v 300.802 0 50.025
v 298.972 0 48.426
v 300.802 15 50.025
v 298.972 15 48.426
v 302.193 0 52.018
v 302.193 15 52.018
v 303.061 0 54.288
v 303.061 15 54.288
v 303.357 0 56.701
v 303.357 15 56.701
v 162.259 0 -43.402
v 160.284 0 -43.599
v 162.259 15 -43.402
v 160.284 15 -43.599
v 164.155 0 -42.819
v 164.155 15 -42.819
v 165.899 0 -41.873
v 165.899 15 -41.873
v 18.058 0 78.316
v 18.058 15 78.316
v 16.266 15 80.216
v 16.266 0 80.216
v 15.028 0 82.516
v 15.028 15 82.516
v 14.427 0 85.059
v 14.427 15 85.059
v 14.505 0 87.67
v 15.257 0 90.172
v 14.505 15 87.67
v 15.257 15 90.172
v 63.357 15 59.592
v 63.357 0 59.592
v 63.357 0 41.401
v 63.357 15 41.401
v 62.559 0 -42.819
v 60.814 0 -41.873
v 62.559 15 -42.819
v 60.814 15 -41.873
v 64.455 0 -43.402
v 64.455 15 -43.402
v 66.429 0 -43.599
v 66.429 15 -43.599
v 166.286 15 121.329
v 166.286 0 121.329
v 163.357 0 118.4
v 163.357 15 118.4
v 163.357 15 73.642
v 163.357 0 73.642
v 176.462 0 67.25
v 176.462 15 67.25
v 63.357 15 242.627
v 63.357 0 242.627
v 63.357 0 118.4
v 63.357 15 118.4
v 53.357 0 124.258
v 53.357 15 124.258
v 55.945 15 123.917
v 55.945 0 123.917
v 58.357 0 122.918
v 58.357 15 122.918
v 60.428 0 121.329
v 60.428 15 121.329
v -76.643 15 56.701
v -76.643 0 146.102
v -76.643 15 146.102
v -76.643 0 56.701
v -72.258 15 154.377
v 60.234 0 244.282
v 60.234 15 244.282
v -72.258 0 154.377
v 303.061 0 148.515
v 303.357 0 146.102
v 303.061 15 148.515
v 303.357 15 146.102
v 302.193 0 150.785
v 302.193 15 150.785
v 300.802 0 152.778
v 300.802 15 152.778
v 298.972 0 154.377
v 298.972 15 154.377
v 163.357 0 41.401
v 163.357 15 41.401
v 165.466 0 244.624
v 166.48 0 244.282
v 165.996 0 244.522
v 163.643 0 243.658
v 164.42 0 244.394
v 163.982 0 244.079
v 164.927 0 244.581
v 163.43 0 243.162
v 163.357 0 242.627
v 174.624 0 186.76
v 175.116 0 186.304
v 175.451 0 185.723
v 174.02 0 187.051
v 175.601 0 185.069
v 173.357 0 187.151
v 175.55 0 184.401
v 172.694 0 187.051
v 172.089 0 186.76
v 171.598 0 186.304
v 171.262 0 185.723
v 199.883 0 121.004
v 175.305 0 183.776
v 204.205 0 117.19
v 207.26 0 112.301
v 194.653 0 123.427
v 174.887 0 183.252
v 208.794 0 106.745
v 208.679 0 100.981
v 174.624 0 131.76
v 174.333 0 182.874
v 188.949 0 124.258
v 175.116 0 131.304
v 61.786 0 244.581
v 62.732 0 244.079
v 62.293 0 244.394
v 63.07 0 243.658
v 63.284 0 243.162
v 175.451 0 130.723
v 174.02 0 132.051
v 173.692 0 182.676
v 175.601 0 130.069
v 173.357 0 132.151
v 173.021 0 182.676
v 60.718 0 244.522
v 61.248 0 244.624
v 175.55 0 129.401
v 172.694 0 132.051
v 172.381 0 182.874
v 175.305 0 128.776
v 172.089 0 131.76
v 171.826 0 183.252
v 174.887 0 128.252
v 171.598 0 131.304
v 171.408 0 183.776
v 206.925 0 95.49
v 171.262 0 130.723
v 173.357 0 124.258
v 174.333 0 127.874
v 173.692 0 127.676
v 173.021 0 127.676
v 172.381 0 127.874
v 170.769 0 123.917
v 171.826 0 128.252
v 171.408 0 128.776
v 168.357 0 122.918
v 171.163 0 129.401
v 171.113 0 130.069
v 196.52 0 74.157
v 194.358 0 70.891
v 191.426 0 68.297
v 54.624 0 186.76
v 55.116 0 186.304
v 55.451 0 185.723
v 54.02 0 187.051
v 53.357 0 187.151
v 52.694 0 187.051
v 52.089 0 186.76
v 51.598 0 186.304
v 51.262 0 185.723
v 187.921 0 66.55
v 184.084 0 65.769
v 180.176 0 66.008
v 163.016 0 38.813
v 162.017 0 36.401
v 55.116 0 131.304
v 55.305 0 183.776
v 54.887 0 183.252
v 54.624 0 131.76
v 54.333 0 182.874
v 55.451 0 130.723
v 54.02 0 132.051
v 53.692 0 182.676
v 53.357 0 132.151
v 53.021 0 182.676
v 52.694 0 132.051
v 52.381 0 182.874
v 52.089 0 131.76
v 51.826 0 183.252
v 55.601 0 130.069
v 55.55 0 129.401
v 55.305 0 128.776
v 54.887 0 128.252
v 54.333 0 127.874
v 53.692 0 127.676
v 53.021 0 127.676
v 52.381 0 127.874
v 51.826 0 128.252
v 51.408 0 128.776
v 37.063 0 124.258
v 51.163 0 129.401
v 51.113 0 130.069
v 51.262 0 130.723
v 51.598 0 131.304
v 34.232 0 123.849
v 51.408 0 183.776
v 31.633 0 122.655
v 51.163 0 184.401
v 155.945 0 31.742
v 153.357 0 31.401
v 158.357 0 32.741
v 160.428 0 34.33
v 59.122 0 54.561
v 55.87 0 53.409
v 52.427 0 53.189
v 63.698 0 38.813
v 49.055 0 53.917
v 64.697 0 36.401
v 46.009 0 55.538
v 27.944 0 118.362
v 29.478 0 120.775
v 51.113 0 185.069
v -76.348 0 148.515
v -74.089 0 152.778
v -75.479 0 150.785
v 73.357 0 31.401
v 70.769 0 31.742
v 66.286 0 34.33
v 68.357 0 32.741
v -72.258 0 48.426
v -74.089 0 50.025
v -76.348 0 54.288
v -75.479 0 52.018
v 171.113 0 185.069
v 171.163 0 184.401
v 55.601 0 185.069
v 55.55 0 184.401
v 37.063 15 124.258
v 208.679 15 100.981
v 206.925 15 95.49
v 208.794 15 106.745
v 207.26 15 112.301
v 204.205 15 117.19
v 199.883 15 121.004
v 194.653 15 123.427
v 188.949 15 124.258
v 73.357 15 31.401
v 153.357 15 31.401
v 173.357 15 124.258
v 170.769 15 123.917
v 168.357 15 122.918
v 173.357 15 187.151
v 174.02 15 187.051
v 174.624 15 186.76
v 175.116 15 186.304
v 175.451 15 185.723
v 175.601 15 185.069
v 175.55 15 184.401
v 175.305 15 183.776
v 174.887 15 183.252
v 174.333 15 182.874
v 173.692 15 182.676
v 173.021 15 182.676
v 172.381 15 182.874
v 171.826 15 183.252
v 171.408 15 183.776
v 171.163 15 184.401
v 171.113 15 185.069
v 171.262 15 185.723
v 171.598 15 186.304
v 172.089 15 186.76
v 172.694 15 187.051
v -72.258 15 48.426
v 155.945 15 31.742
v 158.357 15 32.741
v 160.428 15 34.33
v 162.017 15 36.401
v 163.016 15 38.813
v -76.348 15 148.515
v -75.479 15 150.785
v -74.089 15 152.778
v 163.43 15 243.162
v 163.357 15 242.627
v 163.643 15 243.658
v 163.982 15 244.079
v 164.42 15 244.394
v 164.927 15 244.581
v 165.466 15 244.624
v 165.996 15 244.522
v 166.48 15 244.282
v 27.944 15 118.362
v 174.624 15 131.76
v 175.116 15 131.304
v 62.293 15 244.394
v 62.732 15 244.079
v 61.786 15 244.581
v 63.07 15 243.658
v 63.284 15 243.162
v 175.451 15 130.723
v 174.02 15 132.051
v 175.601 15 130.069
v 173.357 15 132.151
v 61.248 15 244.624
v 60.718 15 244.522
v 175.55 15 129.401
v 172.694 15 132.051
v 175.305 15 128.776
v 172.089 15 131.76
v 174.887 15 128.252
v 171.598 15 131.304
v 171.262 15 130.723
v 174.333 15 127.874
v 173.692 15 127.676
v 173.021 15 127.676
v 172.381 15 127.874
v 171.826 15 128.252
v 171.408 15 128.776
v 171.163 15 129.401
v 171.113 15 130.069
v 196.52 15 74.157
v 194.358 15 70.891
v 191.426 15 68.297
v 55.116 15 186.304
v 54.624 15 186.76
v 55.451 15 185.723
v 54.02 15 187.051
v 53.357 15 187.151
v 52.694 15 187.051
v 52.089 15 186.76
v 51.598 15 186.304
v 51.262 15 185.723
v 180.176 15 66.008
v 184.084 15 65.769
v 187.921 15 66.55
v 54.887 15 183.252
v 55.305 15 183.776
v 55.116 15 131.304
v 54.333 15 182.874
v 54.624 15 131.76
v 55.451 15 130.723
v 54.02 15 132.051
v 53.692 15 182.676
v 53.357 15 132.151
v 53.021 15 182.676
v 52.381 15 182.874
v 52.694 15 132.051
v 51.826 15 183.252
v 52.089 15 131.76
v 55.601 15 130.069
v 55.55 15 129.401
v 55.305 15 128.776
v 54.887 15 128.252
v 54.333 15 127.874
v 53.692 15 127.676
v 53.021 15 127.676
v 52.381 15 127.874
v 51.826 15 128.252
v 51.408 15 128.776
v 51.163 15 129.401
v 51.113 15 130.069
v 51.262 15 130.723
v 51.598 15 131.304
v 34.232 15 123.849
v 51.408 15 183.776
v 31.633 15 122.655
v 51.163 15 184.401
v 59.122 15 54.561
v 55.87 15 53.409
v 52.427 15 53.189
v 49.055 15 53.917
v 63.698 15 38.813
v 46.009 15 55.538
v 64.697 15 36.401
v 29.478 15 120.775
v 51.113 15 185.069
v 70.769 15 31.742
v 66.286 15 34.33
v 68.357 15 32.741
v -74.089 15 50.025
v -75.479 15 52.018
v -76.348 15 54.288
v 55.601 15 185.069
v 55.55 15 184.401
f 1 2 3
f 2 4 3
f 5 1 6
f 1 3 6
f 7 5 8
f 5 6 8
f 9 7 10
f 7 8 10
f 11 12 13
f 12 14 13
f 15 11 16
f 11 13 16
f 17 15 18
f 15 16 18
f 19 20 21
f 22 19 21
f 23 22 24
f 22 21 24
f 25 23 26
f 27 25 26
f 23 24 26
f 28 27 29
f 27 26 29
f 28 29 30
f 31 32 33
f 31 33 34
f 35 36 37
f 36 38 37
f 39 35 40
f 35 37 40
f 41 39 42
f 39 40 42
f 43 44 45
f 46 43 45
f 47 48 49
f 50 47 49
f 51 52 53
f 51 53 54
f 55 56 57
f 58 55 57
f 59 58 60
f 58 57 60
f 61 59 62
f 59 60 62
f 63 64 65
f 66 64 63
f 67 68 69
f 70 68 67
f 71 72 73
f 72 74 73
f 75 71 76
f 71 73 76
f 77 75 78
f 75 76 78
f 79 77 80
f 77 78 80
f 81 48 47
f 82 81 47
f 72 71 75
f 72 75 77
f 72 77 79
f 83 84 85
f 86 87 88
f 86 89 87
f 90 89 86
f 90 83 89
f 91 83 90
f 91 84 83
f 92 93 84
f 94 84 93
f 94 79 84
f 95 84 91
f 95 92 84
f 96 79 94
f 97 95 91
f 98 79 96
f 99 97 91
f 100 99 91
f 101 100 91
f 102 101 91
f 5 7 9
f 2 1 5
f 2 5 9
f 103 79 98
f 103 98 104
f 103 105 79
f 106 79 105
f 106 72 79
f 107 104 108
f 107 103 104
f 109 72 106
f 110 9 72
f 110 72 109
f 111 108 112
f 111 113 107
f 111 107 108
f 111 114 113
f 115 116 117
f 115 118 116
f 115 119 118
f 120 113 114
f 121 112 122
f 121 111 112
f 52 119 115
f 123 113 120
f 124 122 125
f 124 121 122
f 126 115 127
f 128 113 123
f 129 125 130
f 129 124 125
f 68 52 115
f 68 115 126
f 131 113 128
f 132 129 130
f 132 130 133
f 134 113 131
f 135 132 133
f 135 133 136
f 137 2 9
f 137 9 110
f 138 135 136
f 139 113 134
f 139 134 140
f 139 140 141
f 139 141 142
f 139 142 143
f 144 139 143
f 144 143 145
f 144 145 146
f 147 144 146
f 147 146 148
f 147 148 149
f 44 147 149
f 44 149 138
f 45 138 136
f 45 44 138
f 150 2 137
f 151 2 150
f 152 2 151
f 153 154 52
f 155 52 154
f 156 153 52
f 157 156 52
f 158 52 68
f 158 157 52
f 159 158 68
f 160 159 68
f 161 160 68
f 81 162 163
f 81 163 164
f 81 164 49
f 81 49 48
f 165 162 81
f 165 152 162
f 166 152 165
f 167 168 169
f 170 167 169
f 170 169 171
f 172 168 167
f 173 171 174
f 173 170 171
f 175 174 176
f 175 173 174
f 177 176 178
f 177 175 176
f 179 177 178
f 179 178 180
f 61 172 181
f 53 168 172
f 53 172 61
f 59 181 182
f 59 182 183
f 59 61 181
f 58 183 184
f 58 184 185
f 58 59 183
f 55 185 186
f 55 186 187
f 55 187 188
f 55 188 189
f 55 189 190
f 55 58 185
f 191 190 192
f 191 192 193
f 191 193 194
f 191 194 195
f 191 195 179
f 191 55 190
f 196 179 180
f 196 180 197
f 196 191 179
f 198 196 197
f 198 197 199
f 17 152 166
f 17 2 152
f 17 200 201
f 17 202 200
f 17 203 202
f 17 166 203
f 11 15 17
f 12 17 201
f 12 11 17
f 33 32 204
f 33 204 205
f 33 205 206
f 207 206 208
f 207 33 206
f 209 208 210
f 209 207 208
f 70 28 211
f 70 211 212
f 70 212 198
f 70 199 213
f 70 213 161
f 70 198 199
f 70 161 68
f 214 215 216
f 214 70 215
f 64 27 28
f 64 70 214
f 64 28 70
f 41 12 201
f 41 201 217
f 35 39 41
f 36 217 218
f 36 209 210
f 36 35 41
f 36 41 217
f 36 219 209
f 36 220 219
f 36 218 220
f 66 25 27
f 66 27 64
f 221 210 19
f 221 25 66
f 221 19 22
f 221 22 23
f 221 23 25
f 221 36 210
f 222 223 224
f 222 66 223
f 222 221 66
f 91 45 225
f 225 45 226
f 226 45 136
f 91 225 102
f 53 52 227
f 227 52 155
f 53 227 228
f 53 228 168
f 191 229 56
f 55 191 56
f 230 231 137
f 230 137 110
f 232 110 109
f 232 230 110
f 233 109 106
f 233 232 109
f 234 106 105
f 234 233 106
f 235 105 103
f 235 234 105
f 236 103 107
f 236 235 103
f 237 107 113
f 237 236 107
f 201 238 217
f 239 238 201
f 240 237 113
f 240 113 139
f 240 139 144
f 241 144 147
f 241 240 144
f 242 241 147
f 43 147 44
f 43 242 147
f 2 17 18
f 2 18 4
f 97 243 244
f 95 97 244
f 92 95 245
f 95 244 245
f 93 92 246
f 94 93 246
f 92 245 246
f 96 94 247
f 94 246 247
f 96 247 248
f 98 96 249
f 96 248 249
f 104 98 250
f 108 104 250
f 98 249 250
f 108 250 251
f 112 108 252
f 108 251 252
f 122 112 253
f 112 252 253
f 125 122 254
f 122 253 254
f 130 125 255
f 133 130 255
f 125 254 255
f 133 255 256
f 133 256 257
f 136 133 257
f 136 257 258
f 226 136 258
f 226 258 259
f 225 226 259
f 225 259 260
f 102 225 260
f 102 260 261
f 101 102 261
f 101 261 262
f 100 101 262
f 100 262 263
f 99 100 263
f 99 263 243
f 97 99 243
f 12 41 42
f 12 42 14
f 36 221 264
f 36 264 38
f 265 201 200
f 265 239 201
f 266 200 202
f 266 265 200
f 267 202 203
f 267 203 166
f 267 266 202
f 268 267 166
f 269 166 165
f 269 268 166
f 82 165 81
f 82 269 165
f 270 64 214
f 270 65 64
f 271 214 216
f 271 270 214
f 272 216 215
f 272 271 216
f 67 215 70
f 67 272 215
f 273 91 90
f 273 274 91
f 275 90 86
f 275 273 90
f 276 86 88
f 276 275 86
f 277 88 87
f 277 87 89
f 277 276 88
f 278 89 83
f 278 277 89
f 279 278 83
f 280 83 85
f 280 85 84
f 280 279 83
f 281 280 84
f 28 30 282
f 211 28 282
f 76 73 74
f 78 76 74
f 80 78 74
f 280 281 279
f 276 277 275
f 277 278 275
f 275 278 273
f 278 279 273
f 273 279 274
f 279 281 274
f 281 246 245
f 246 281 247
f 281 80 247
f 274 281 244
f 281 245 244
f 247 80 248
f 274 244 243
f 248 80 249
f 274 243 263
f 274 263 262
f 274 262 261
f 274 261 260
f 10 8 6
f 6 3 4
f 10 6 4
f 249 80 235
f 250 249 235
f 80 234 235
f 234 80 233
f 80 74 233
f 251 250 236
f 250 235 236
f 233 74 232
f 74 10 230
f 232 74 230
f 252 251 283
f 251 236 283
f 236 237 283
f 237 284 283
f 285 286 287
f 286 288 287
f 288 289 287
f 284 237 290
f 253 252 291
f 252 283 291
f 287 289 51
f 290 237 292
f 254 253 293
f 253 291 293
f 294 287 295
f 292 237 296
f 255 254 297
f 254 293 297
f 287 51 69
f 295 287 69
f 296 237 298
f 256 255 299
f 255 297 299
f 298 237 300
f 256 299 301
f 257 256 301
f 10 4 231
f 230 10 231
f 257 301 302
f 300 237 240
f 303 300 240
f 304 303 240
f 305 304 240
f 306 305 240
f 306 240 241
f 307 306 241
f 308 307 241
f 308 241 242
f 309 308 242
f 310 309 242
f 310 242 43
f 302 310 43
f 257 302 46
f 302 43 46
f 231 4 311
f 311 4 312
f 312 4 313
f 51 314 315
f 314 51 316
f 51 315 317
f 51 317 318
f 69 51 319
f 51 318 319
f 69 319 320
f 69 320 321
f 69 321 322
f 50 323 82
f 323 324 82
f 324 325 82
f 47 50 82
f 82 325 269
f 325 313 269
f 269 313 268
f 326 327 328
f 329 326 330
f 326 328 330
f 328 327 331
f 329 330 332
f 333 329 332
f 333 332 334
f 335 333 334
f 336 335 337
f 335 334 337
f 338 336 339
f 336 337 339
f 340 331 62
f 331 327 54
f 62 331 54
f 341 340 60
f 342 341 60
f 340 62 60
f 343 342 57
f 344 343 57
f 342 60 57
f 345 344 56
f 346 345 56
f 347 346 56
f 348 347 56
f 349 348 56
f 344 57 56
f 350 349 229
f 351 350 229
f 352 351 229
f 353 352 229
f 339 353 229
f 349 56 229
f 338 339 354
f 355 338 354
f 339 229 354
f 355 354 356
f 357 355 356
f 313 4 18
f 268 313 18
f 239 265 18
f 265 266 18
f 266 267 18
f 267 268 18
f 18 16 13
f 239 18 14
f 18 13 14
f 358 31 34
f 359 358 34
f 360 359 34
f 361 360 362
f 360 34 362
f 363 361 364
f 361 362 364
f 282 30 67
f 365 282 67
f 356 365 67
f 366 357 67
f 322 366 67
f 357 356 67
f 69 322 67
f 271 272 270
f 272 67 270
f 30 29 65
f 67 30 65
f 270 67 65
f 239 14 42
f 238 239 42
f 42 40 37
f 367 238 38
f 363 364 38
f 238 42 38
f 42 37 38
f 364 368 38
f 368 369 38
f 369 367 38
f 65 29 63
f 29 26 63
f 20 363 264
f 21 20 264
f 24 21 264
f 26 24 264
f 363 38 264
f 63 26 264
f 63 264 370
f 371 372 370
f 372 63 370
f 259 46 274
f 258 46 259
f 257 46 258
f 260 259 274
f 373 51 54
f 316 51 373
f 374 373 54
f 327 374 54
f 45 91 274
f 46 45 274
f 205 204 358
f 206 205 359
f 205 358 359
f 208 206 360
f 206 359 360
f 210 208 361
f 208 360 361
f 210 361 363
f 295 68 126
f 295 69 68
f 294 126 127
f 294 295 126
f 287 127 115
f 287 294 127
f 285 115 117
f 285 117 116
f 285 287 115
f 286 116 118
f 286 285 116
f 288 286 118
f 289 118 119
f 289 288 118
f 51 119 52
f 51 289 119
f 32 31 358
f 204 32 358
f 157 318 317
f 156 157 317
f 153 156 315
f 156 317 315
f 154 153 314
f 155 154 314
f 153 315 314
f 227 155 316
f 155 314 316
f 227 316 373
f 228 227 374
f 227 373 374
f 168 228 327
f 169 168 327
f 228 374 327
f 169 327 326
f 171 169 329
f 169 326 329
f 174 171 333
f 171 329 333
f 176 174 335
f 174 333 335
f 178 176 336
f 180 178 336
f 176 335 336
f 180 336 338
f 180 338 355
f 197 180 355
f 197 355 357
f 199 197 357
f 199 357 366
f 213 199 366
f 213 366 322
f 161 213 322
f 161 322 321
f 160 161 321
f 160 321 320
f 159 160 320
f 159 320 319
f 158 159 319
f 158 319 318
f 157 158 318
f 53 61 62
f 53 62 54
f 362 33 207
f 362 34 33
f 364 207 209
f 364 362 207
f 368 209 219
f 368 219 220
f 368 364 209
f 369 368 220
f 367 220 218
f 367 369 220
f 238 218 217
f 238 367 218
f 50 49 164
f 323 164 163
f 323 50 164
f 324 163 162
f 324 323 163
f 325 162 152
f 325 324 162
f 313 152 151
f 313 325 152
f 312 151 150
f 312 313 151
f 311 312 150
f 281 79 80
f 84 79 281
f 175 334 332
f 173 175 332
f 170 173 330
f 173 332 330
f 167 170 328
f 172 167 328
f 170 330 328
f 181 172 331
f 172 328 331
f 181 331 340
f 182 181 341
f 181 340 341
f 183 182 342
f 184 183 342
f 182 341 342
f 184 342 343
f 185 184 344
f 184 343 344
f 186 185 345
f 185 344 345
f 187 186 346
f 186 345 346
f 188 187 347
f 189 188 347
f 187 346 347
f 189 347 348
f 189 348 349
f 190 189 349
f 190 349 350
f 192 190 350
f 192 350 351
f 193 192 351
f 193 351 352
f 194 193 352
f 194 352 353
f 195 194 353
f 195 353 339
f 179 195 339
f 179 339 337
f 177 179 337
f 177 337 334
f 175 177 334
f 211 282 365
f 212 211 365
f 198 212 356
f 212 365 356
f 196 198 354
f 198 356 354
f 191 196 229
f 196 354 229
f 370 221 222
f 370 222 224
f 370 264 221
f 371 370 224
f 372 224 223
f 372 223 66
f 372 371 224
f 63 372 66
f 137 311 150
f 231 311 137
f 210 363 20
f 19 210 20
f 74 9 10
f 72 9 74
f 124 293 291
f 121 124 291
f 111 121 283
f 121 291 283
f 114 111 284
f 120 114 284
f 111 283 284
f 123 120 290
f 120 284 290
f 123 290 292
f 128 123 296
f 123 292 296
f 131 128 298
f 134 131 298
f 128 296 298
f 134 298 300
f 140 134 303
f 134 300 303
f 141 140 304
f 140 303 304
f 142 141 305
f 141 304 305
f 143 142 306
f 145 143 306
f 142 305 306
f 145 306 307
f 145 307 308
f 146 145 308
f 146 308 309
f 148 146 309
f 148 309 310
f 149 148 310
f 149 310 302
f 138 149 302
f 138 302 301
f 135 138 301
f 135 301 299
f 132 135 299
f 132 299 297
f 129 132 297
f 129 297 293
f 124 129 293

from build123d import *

# Parameters (mm, degrees)
BOSS_EXTRU_1_DEPTH       = 15
ESQUISSE6_W              = 100
ESQUISSE6_H              = 15
ENL_V_MAT_EXTRU_1_DEPTH  = 215
ENL_V_MAT_EXTRU_10_REACH = 393.106
ESQUISSE11_R             = 2.25
ENL_V_MAT_EXTRU_11_REACH = 393.106
ESQUISSE8_R              = 2.25
CONG_10_R                = 10
CONG_11_R                = 2
ENL_V_MAT_EXTRU_12_REACH = 391.991


with BuildPart() as part:
    # Esquisse1 → Boss.-Extru.1 (new body)
    with BuildSketch(Plane(origin=(0, 0, 0), x_dir=(1, 0, 0), z_dir=(0, 1, 0))):
        Polygon((-76.643189126, -51.401333399), (63.356810874, 43.598666601), (163.356810874, 43.598666601), (303.356810874, -51.401333399), (303.356810874, -151.401333399), (163.356810874, -246.401333399), (63.356810874, -246.401333399), (-76.643189126, -151.401333399), align=None)
    extrude(amount=BOSS_EXTRU_1_DEPTH)

    # Esquisse6 → Enlèv. mat.-Extru.1 (cut)
    with BuildSketch(Plane.XY.offset(246.401333399)):
        with Locations((113.356810874, 7.5)):
            Rectangle(ESQUISSE6_W, ESQUISSE6_H)
    extrude(amount=-ENL_V_MAT_EXTRU_1_DEPTH, mode=Mode.SUBTRACT)

    # Esquisse11 → Enlèv. mat.-Extru.10 (cut, up to next)
    with BuildSketch(Plane(origin=(0, 15, 0), x_dir=(1, 0, 0), z_dir=(0, 1, 0)), mode=Mode.PRIVATE) as enl_v_mat_extru_10_sk1:
        with Locations(Location((53.356810874, -129.901333399, 0), (0, 0, 270))):
            Circle(ESQUISSE11_R)
    enl_v_mat_extru_10_tool1 = extrude(enl_v_mat_extru_10_sk1.sketch, amount=-ENL_V_MAT_EXTRU_10_REACH, mode=Mode.PRIVATE) & part.part
    # Esquisse11 → Enlèv. mat.-Extru.10 (cut, up to next)
    with BuildSketch(Plane(origin=(0, 15, 0), x_dir=(1, 0, 0), z_dir=(0, 1, 0)), mode=Mode.PRIVATE) as enl_v_mat_extru_10_sk2:
        with Locations(Location((53.356810874, -184.901333399, 0), (0, 0, 270))):
            Circle(ESQUISSE11_R)
    enl_v_mat_extru_10_tool2 = extrude(enl_v_mat_extru_10_sk2.sketch, amount=-ENL_V_MAT_EXTRU_10_REACH, mode=Mode.PRIVATE) & part.part
    # Esquisse11 → Enlèv. mat.-Extru.10 (cut, up to next)
    with BuildSketch(Plane(origin=(0, 15, 0), x_dir=(1, 0, 0), z_dir=(0, 1, 0)), mode=Mode.PRIVATE) as enl_v_mat_extru_10_sk3:
        with Locations(Location((173.356810874, -129.901333399, 0), (0, 0, 270))):
            Circle(ESQUISSE11_R)
    enl_v_mat_extru_10_tool3 = extrude(enl_v_mat_extru_10_sk3.sketch, amount=-ENL_V_MAT_EXTRU_10_REACH, mode=Mode.PRIVATE) & part.part
    # Esquisse11 → Enlèv. mat.-Extru.10 (cut, up to next)
    with BuildSketch(Plane(origin=(0, 15, 0), x_dir=(1, 0, 0), z_dir=(0, 1, 0)), mode=Mode.PRIVATE) as enl_v_mat_extru_10_sk4:
        with Locations(Location((173.356810874, -184.901333399, 0), (0, 0, 270))):
            Circle(ESQUISSE11_R)
    enl_v_mat_extru_10_tool4 = extrude(enl_v_mat_extru_10_sk4.sketch, amount=-ENL_V_MAT_EXTRU_10_REACH, mode=Mode.PRIVATE) & part.part
    add(enl_v_mat_extru_10_tool1.solids().sort_by_distance((53.356811, 15, 129.901333))[0], mode=Mode.SUBTRACT)
    add(enl_v_mat_extru_10_tool2.solids().sort_by_distance((53.356811, 15, 184.901333))[0], mode=Mode.SUBTRACT)
    add(enl_v_mat_extru_10_tool3.solids().sort_by_distance((173.356811, 15, 129.901333))[0], mode=Mode.SUBTRACT)
    add(enl_v_mat_extru_10_tool4.solids().sort_by_distance((173.356811, 15, 184.901333))[0], mode=Mode.SUBTRACT)

    # Esquisse8 → Enlèv. mat.-Extru.11 (cut, up to next)
    with BuildSketch(Plane(origin=(0, 15, 0), x_dir=(1, 0, 0), z_dir=(0, 1, 0)), mode=Mode.PRIVATE) as enl_v_mat_extru_11_sk1:
        with Locations(Location((180.356810874, -120.901333399, 0), (0, 0, 270))):
            Circle(ESQUISSE8_R)
    enl_v_mat_extru_11_tool1 = extrude(enl_v_mat_extru_11_sk1.sketch, amount=-ENL_V_MAT_EXTRU_11_REACH, mode=Mode.PRIVATE) & part.part
    # Esquisse8 → Enlèv. mat.-Extru.11 (cut, up to next)
    with BuildSketch(Plane(origin=(0, 15, 0), x_dir=(1, 0, 0), z_dir=(0, 1, 0)), mode=Mode.PRIVATE) as enl_v_mat_extru_11_sk2:
        with Locations(Location((180.356810874, -81.901333399, 0), (0, 0, 270))):
            Circle(ESQUISSE8_R)
    enl_v_mat_extru_11_tool2 = extrude(enl_v_mat_extru_11_sk2.sketch, amount=-ENL_V_MAT_EXTRU_11_REACH, mode=Mode.PRIVATE) & part.part
    # Esquisse8 → Enlèv. mat.-Extru.11 (cut, up to next)
    with BuildSketch(Plane(origin=(0, 15, 0), x_dir=(1, 0, 0), z_dir=(0, 1, 0)), mode=Mode.PRIVATE) as enl_v_mat_extru_11_sk3:
        with Locations(Location((46.356810874, -120.901333399, 0), (0, 0, 270))):
            Circle(ESQUISSE8_R)
    enl_v_mat_extru_11_tool3 = extrude(enl_v_mat_extru_11_sk3.sketch, amount=-ENL_V_MAT_EXTRU_11_REACH, mode=Mode.PRIVATE) & part.part
    # Esquisse8 → Enlèv. mat.-Extru.11 (cut, up to next)
    with BuildSketch(Plane(origin=(0, 15, 0), x_dir=(1, 0, 0), z_dir=(0, 1, 0)), mode=Mode.PRIVATE) as enl_v_mat_extru_11_sk4:
        with Locations(Location((46.356810874, -81.901333399, 0), (0, 0, 270))):
            Circle(ESQUISSE8_R)
    enl_v_mat_extru_11_tool4 = extrude(enl_v_mat_extru_11_sk4.sketch, amount=-ENL_V_MAT_EXTRU_11_REACH, mode=Mode.PRIVATE) & part.part
    add(enl_v_mat_extru_11_tool1.solids().sort_by_distance((180.356811, 15, 120.901333))[0], mode=Mode.SUBTRACT)
    add(enl_v_mat_extru_11_tool2.solids().sort_by_distance((180.356811, 15, 81.901333))[0], mode=Mode.SUBTRACT)
    add(enl_v_mat_extru_11_tool3.solids().sort_by_distance((46.356811, 15, 120.901333))[0], mode=Mode.SUBTRACT)
    add(enl_v_mat_extru_11_tool4.solids().sort_by_distance((46.356811, 15, 81.901333))[0], mode=Mode.SUBTRACT)

    # Congé10
    cong_10_edges = [part.edges().sort_by_distance(p)[0] for p in [
        (-76.643189126, 7.5, 51.401333399),
        (63.356810874, 7.5, -43.598666601),
        (163.356810874, 7.5, -43.598666601),
        (303.356810874, 7.5, 51.401333399),
        (303.356810874, 7.5, 151.401333399),
        (-76.643189126, 7.5, 151.401333399),
        (63.356810874, 7.5, 31.401333399),
        (163.356810874, 7.5, 31.401333399),
    ]]
    fillet(cong_10_edges, radius=CONG_10_R)

    # Congé11
    cong_11_edges = [part.edges().sort_by_distance(p)[0] for p in [
        (163.356810874, 7.5, 246.401333399),
        (63.356810874, 7.5, 246.401333399),
    ]]
    fillet(cong_11_edges, radius=CONG_11_R)

    # Esquisse12 → Enlèv. mat.-Extru.12 (cut, up to next)
    with BuildSketch(Plane(origin=(0, 15, 0), x_dir=(1, 0, 0), z_dir=(0, 1, 0)), mode=Mode.PRIVATE) as enl_v_mat_extru_12_sk1:
        with BuildLine():
            Line((46.009256573, -55.538188752), (18.058498347, -78.315798735))
            ThreePointArc((18.058498347, -78.315798735), (14.643777091, -83.767882822), (15.256670784, -90.171780344))
            Line((15.256670784, -90.171780344), (27.943631129, -118.361875593))
            ThreePointArc((27.943631129, -118.361875593), (31.633138728, -122.655474578), (37.06267458, -124.257847507))
            Line((37.06267458, -124.257847507), (53.356810874, -124.257847507))
            ThreePointArc((53.356810874, -124.257847507), (57.183645198, -123.496642832), (60.427878686, -121.328915318))
            Line((60.427878686, -121.328915318), (63.356810874, -118.39998313))
            Line((63.356810874, -118.39998313), (63.356810874, -59.592280682))
            Line((63.356810874, -59.592280682), (59.121809419, -54.561118788))
            ThreePointArc((59.121809419, -54.561118788), (52.42687157, -53.188778562), (46.009256573, -55.538188752))
        make_face()
    enl_v_mat_extru_12_tool1 = extrude(enl_v_mat_extru_12_sk1.sketch, amount=-ENL_V_MAT_EXTRU_12_REACH, mode=Mode.PRIVATE) & part.part
    # Esquisse12 → Enlèv. mat.-Extru.12 (cut, up to next)
    with BuildSketch(Plane(origin=(0, 15, 0), x_dir=(1, 0, 0), z_dir=(0, 1, 0)), mode=Mode.PRIVATE) as enl_v_mat_extru_12_sk2:
        with BuildLine():
            Line((166.285743062, -121.328915318), (163.356810874, -118.39998313))
            Line((163.356810874, -118.39998313), (163.356810874, -73.642376596))
            Line((163.356810874, -73.642376596), (176.462200108, -67.250451181))
            ThreePointArc((176.462200108, -67.250451181), (187.921289626, -66.549583242), (196.519678004, -74.156794674))
            Line((196.519678004, -74.156794674), (206.924784537, -95.490424571))
            ThreePointArc((206.924784537, -95.490424571), (205.909865534, -114.856232791), (188.948903611, -124.257847507))
            Line((188.948903611, -124.257847507), (173.356810874, -124.257847507))
            ThreePointArc((173.356810874, -124.257847507), (169.529976551, -123.496642832), (166.285743062, -121.328915318))
        make_face()
    enl_v_mat_extru_12_tool2 = extrude(enl_v_mat_extru_12_sk2.sketch, amount=-ENL_V_MAT_EXTRU_12_REACH, mode=Mode.PRIVATE) & part.part
    add(enl_v_mat_extru_12_tool1.solids().sort_by_distance((43.070441, 15, 90.852572))[0], mode=Mode.SUBTRACT)
    add(enl_v_mat_extru_12_tool2.solids().sort_by_distance((183.873626, 15, 97.045657))[0], mode=Mode.SUBTRACT)


solid = part.part
